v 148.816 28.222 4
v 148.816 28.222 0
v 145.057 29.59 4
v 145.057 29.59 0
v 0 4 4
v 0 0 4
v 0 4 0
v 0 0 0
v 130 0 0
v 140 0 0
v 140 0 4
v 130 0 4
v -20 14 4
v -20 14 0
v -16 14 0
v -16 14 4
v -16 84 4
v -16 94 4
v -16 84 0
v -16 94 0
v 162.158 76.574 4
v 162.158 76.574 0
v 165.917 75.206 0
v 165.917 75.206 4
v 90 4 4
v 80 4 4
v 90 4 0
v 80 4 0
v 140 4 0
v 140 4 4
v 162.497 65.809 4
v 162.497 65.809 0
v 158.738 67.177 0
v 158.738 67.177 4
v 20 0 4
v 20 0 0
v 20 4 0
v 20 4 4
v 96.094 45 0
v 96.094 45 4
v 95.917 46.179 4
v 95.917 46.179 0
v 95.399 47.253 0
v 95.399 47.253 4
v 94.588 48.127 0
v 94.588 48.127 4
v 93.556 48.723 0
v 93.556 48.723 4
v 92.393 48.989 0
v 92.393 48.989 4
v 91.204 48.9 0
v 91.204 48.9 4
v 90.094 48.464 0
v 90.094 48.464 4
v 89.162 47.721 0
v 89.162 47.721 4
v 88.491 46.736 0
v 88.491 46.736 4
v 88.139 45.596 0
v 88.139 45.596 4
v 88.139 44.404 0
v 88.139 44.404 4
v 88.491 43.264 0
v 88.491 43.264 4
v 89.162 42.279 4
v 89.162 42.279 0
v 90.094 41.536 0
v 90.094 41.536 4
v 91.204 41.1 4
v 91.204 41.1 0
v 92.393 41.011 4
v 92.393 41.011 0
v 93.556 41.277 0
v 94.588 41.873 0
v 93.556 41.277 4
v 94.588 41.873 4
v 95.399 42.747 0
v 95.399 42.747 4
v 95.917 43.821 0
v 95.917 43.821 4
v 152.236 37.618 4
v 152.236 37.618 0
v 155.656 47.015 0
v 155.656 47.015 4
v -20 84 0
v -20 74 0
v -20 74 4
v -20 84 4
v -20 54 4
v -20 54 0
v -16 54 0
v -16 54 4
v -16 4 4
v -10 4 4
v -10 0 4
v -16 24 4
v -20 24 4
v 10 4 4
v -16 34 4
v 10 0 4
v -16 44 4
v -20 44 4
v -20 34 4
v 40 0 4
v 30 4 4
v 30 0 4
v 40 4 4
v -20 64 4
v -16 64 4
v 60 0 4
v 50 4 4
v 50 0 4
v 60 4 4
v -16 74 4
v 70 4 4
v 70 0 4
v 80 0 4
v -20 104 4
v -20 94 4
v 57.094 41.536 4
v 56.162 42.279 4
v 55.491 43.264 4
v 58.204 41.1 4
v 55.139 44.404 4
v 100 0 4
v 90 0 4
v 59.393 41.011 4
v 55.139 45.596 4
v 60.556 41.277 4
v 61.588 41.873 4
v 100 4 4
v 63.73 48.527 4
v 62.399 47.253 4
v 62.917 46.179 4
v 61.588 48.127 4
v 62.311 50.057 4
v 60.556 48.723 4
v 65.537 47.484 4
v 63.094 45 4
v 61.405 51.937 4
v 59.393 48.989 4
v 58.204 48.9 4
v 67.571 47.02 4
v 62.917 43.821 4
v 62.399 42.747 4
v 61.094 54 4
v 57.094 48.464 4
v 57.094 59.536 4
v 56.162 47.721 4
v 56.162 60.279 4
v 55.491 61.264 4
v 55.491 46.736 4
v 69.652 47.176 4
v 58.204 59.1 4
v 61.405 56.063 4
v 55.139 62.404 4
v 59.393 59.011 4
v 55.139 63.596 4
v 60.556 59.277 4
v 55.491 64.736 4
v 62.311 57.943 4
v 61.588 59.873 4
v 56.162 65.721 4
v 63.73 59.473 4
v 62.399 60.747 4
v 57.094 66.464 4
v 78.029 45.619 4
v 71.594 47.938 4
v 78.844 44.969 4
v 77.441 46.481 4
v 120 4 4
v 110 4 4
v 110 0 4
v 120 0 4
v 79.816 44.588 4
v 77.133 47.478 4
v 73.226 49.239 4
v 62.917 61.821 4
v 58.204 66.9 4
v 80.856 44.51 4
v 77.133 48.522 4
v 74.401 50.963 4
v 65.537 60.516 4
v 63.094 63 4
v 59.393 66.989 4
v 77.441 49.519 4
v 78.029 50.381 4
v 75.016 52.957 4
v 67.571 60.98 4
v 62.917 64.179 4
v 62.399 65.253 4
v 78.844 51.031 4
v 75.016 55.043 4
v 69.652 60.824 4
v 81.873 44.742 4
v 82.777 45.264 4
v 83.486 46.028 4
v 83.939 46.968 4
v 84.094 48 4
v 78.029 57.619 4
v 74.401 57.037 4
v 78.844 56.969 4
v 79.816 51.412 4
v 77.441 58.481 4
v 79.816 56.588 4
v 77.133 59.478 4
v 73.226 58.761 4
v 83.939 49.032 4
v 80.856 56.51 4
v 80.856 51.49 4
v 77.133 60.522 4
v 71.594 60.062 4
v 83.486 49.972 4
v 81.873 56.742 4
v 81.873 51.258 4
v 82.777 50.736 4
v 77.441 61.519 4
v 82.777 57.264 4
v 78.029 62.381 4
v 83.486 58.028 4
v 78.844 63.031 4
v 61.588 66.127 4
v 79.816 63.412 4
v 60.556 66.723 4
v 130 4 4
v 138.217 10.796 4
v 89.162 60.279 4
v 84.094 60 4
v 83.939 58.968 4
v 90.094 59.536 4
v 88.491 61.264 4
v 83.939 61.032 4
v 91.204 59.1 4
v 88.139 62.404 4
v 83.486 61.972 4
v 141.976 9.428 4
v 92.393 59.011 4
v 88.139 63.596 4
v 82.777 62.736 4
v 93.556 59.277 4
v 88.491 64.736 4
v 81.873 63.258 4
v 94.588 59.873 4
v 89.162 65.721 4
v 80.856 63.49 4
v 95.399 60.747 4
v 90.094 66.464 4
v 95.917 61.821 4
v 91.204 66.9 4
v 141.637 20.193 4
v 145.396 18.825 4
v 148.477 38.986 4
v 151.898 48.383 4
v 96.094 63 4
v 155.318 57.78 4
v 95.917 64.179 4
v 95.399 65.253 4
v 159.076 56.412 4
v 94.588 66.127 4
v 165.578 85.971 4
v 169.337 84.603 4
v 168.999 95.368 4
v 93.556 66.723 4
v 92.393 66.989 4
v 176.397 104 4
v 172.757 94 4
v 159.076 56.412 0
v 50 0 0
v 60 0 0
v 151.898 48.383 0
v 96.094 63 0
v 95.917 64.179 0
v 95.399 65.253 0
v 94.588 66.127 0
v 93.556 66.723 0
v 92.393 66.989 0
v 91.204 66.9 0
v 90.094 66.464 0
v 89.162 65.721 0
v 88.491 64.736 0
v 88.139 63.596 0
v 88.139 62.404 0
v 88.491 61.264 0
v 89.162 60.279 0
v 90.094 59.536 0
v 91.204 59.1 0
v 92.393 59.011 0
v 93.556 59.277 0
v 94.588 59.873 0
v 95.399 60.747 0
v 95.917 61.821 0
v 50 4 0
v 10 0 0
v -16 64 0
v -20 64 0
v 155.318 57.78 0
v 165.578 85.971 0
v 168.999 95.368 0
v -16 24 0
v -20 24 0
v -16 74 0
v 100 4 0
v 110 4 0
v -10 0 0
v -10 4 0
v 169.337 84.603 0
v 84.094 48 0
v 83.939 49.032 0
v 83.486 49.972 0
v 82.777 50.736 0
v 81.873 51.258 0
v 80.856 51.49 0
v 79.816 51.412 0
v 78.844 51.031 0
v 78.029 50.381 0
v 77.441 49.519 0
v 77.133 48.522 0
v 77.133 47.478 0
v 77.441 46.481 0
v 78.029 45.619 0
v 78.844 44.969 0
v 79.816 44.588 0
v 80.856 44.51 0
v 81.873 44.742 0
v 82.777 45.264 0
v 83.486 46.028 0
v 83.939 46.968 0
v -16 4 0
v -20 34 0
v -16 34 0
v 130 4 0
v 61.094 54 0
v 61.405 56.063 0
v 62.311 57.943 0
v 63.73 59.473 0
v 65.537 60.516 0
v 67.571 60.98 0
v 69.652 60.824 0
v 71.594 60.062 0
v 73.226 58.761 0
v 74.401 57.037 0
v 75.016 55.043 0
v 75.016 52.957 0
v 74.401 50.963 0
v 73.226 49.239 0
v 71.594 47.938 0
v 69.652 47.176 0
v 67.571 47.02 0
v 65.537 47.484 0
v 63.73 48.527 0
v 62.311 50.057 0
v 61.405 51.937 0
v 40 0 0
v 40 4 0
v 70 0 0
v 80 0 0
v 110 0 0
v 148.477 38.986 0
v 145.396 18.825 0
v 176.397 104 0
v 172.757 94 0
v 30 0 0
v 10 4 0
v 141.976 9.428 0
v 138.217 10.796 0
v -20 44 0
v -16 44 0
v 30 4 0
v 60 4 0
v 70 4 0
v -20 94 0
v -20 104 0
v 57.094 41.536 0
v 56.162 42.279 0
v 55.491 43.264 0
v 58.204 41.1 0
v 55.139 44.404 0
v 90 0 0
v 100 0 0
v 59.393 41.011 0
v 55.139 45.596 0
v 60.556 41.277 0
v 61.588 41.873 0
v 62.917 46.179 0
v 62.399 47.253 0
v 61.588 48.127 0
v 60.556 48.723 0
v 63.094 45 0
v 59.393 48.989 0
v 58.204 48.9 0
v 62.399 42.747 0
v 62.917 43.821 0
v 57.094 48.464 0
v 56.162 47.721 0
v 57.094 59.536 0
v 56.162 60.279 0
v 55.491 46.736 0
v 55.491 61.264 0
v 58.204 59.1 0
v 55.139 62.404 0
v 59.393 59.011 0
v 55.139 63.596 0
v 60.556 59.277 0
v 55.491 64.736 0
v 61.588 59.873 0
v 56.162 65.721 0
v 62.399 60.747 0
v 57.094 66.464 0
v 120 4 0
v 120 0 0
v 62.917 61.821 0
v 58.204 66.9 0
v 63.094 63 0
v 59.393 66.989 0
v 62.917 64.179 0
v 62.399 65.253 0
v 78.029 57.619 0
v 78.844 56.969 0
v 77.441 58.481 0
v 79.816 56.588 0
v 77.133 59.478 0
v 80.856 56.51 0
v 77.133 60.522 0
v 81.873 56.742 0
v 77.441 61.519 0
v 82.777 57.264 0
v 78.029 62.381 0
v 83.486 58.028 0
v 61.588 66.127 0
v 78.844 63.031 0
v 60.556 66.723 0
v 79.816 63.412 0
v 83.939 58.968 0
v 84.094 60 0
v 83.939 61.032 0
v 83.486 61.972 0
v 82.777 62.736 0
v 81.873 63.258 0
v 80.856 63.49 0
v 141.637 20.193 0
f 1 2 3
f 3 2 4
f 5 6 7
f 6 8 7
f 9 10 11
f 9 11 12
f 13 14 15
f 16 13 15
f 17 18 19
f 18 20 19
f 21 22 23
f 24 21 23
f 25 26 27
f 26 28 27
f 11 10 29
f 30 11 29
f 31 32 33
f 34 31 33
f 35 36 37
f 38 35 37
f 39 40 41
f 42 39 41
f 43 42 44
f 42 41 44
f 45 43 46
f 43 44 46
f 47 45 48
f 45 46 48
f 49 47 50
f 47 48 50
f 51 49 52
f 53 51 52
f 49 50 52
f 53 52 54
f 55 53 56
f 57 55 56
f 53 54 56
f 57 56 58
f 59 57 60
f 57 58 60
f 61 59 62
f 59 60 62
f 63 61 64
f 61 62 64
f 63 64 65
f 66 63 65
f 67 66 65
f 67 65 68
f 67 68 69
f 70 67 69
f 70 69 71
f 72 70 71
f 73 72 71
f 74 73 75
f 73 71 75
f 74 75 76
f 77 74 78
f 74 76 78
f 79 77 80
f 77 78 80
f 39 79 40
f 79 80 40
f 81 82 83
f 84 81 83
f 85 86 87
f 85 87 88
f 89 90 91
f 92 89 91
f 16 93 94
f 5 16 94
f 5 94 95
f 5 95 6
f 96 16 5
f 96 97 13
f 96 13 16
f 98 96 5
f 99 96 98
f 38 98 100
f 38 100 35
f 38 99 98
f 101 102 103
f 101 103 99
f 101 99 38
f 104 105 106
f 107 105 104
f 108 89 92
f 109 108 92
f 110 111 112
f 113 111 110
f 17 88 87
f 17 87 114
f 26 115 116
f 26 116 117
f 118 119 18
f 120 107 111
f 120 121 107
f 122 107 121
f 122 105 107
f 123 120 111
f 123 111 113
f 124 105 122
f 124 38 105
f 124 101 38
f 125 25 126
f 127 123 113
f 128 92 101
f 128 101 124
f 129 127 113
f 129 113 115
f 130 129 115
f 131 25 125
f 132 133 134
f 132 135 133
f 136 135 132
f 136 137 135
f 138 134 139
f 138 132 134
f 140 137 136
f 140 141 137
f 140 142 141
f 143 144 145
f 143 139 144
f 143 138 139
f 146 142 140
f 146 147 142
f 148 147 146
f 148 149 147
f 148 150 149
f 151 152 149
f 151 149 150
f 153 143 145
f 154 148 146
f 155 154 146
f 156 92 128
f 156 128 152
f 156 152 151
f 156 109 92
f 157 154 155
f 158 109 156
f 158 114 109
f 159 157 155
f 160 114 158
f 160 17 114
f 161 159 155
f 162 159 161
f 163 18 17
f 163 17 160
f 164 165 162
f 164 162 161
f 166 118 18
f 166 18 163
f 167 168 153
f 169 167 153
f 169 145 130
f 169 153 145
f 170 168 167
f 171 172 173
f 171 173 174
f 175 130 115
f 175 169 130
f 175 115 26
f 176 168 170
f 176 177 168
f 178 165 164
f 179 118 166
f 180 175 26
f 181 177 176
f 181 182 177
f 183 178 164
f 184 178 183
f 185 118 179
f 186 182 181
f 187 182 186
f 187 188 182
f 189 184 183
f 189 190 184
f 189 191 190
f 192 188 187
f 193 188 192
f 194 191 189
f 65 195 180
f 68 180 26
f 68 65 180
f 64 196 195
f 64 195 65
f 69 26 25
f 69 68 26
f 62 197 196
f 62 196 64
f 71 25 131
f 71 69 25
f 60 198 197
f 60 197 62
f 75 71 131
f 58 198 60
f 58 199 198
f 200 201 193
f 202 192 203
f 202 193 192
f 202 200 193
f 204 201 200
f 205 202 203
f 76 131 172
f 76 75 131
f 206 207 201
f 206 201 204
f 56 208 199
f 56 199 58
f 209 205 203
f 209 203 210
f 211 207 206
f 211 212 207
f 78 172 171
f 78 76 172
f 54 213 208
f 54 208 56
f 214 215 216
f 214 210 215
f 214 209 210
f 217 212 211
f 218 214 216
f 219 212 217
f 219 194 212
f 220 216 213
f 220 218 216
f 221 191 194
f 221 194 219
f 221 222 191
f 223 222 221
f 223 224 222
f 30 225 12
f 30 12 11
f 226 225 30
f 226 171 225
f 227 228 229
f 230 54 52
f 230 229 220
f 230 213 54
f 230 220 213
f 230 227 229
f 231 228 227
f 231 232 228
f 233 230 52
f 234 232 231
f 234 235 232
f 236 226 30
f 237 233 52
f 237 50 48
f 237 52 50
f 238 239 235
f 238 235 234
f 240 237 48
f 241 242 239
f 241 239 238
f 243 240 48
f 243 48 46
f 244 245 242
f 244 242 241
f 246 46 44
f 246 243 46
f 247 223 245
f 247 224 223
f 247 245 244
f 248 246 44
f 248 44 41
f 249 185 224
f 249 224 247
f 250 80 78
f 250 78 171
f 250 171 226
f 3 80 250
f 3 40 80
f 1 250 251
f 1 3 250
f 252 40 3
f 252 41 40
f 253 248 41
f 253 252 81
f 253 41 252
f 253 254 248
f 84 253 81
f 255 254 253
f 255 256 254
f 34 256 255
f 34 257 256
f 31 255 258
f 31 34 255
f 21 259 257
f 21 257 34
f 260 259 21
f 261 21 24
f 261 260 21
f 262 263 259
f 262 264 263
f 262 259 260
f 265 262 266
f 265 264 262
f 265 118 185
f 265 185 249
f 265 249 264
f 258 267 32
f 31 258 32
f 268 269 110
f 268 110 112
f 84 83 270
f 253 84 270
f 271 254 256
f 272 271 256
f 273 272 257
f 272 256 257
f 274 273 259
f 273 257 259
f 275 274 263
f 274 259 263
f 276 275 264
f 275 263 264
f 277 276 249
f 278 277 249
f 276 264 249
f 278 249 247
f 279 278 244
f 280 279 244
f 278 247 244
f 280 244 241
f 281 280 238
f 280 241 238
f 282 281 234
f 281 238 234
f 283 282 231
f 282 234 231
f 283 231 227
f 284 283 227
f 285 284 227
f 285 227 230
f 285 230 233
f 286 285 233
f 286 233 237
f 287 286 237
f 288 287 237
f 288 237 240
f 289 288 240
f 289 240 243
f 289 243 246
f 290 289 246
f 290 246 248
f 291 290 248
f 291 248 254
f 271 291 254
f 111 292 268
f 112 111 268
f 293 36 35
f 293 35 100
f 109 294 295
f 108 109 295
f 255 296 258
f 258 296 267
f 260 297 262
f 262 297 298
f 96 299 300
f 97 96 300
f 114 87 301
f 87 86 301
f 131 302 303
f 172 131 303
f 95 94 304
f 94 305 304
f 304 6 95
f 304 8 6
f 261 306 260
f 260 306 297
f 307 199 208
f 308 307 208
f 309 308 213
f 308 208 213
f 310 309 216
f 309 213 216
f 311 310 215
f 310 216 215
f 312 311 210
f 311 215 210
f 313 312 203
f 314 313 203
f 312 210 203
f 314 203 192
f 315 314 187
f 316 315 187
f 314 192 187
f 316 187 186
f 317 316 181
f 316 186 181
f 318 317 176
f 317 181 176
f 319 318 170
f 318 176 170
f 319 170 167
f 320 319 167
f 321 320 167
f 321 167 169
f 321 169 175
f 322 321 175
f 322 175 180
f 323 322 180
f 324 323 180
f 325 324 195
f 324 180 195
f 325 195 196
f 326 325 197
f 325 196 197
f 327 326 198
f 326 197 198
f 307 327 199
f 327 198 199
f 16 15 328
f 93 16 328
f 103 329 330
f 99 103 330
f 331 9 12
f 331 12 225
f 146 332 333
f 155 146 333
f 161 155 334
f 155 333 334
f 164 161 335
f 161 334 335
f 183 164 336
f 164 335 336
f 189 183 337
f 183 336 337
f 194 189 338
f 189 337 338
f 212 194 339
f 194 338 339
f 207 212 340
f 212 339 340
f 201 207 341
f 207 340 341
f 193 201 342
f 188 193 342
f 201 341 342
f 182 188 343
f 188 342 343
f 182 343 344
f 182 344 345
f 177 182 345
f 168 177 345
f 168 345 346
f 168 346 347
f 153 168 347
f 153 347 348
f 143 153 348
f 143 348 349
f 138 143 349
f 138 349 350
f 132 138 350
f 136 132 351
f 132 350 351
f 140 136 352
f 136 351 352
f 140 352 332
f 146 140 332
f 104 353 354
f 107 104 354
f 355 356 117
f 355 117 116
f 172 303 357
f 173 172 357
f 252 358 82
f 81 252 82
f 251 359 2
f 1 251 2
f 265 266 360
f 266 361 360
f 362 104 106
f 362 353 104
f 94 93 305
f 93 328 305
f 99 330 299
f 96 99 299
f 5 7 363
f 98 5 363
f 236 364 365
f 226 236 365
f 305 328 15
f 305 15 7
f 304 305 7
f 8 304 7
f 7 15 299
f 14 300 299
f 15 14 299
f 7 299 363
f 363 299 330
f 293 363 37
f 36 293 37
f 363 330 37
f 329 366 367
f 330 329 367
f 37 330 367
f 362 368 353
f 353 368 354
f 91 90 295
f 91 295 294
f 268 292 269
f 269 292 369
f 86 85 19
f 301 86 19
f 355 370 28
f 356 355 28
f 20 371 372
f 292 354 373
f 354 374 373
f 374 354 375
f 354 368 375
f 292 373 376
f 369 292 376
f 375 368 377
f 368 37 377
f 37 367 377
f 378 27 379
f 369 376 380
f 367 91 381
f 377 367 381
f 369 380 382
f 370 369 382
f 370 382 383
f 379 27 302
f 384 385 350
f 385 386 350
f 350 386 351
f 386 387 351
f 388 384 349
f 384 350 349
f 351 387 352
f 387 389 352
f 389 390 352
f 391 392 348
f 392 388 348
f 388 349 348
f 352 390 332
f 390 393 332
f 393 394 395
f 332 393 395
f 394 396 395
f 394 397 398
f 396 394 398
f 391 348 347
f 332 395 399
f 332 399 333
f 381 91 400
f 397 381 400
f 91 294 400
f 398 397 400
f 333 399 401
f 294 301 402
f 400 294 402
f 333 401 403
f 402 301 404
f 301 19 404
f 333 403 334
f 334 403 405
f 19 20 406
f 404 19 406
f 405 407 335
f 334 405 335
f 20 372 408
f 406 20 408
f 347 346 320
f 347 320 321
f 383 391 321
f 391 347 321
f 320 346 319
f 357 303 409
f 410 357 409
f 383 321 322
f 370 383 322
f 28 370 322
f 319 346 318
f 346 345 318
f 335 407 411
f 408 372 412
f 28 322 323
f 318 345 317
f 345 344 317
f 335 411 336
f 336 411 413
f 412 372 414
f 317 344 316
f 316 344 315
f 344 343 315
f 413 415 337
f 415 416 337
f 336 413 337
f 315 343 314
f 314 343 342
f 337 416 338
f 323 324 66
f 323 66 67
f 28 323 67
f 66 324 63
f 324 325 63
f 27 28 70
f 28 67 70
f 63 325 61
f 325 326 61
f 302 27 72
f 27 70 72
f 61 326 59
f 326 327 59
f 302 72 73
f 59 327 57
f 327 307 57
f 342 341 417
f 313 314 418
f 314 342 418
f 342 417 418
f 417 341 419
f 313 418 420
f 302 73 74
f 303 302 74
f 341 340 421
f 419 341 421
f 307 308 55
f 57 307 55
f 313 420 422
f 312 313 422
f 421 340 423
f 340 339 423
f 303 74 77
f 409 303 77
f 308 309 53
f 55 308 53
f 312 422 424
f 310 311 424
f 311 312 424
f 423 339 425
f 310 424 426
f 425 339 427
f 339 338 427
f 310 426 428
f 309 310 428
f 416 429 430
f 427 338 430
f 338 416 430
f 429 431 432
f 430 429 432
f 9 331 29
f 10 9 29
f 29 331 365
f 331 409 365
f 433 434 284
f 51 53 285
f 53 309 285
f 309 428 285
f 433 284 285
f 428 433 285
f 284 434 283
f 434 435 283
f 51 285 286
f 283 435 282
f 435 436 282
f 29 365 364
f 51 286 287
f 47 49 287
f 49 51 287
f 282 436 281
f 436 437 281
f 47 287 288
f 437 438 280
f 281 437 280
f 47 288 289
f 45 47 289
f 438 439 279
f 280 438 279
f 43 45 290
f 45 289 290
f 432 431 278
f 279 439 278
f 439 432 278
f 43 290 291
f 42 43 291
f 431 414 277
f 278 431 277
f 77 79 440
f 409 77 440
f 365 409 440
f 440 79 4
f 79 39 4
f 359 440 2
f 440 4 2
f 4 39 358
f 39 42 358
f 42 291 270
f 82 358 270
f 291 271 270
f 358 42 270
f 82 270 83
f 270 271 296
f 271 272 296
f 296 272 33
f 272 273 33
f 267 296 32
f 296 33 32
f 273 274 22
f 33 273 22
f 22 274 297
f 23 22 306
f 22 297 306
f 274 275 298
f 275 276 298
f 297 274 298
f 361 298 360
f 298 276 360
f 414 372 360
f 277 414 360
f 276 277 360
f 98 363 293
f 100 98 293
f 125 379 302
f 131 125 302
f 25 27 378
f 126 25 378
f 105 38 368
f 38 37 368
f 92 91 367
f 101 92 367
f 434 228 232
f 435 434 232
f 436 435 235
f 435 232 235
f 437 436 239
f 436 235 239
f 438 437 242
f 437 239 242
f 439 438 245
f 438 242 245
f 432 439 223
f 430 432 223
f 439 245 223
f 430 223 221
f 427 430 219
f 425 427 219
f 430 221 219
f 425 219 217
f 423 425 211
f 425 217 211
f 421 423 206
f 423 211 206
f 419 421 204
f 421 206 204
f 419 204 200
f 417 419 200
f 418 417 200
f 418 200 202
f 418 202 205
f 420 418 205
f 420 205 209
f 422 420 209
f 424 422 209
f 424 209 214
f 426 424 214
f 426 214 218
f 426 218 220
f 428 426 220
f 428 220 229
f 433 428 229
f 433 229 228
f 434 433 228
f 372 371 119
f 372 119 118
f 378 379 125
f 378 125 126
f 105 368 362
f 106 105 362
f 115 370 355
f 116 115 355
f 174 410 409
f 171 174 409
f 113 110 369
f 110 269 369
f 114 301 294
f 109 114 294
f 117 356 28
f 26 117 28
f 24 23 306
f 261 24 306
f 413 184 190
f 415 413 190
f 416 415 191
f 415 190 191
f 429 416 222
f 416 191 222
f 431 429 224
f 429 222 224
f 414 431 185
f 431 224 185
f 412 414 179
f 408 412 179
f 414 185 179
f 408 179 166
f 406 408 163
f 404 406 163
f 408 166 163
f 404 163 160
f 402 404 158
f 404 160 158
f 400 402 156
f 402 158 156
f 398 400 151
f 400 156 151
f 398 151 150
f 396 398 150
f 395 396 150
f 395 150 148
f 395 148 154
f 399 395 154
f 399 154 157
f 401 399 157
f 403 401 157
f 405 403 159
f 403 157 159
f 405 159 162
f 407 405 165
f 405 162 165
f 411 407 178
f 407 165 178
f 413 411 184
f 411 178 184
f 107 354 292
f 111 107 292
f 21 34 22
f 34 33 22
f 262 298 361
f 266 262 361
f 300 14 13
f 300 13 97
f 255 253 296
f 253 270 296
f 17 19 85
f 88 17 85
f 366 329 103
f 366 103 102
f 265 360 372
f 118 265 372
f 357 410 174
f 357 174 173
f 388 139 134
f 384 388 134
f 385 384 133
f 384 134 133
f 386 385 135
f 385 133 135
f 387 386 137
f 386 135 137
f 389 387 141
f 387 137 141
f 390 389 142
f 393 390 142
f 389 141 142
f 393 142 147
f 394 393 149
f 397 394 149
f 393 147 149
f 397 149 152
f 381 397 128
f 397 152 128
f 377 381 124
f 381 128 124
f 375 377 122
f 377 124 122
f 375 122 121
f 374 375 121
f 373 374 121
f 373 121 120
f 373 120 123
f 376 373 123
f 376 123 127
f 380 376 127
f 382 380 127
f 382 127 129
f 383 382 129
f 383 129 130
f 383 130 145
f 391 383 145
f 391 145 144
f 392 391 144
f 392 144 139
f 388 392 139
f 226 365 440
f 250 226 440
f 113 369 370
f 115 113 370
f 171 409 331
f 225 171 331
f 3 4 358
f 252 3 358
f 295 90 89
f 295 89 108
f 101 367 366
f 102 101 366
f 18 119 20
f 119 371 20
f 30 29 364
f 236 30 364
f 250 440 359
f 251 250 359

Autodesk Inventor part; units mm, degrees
ref_plane "YZ Plane" through (0, 0, 0) normal (1, 0, 0) x (0, 1, 0)
ref_plane "XZ Plane" through (0, 0, 0) normal (0, 1, 0) x (-1, 0, 0)
ref_plane "XY Plane" through (0, 0, 0) normal (0, 0, 1) x (1, 0, 0)
sketch "Эскиз1" plane through (0, 0, 0) normal (0, 0, 1) x (1, 0, 0)
  line L0 (130, 0) -> (130, 4) projected
  line L1 (140, 4) -> (130, 4) projected
  line L2 (140, 0) -> (140, 4) projected
  line L3 (140, 0) -> (130, 0) projected
  line L4 (120, 0) -> (120, 4) projected
  line L5 (120, 4) -> (110, 4) projected
  line L6 (110, 4) -> (110, 0) projected
  line L7 (120, 0) -> (110, 0) projected
  line L8 (90, 4) -> (90, 0) projected
  line L9 (100, 0) -> (90, 0) projected
  line L10 (100, 0) -> (100, 4) projected
  line L11 (100, 4) -> (90, 4) projected
  line L12 (80, 0) -> (80, 4) projected
  line L13 (80, 4) -> (70, 4) projected
  line L14 (70, 4) -> (70, 0) projected
  line L15 (80, 0) -> (70, 0) projected
  line L16 (50, 4) -> (50, 0) projected
  line L17 (60, 0) -> (50, 0) projected
  line L18 (60, 0) -> (60, 4) projected
  line L19 (60, 4) -> (50, 4) projected
  line L20 (40, 0) -> (40, 4) projected
  line L21 (40, 4) -> (30, 4) projected
  line L22 (30, 4) -> (30, 0) projected
  line L23 (40, 0) -> (30, 0) projected
  line L24 (10, 4) -> (10, 0) projected
  line L25 (20, 0) -> (10, 0) projected
  line L26 (20, 0) -> (20, 4) projected
  line L27 (20, 4) -> (10, 4) projected
  line L28 (0, 0) -> (0, 4) projected
  line L29 (0, 4) -> (-10, 4) projected
  line L30 (-10, 4) -> (-10, 0) projected
  line L31 (0, 0) -> (-10, 0) projected
  line L32 (-20, 4) -> (-10, 4) projected
  line L33 (-20, 4) -> (140, 4)
  line L34 (-20, 4) -> (-20, 104)
  line L35 (140, 4) -> (176.397, 104)
  line L36 (140, 4) -> (246.4178, 4) construction
  line L37 (176.397, 104) -> (-20, 104)
  line L38 (-20, 94) -> (-16, 94)
  line L39 (-16, 94) -> (-16, 84)
  line L40 (-16, 84) -> (-20, 84)
  line L41 (-20, 84) -> (-20, 94)
  line L42 (-16, 74) -> (-16, 64)
  line L43 (-20, 64) -> (-20, 74)
  line L44 (-20, 74) -> (-16, 74)
  line L45 (-16, 64) -> (-20, 64)
  line L46 (-16, 54) -> (-16, 44)
  line L47 (-20, 44) -> (-20, 54)
  line L48 (-20, 54) -> (-16, 54)
  line L49 (-16, 44) -> (-20, 44)
  line L50 (-16, 34) -> (-16, 24)
  line L51 (-20, 24) -> (-20, 34)
  line L52 (-20, 34) -> (-16, 34)
  line L53 (-16, 24) -> (-20, 24)
  line L54 (-16, 14) -> (-16, 4)
  line L55 (-20, 4) -> (-20, 14)
  line L56 (-20, 14) -> (-16, 14)
  line L57 (-16, 4) -> (-20, 4)
  line L58 (172.7573, 94) -> (169.3371, 84.6031)
  line L59 (169.3371, 84.6031) -> (165.5783, 85.9712)
  line L60 (165.5783, 85.9712) -> (168.9986, 95.3681)
  line L61 (168.9986, 95.3681) -> (172.7573, 94)
  line L62 (158.7379, 67.1773) -> (162.1581, 76.5742)
  line L63 (165.9169, 75.2061) -> (162.4967, 65.8092)
  line L64 (162.1581, 76.5742) -> (165.9169, 75.2061)
  line L65 (162.4967, 65.8092) -> (158.7379, 67.1773)
  line L66 (151.8975, 48.3834) -> (155.3177, 57.7804)
  line L67 (159.0765, 56.4123) -> (155.6563, 47.0154)
  line L68 (155.3177, 57.7804) -> (159.0765, 56.4123)
  line L69 (155.6563, 47.0154) -> (151.8975, 48.3834)
  line L70 (145.0571, 29.5896) -> (148.4773, 38.9865)
  line L71 (152.2361, 37.6184) -> (148.8159, 28.2215)
  line L72 (148.4773, 38.9865) -> (152.2361, 37.6184)
  line L73 (148.8159, 28.2215) -> (145.0571, 29.5896)
  line L74 (138.2167, 10.7957) -> (141.6369, 20.1927)
  line L75 (145.3957, 18.8246) -> (141.9755, 9.4277)
  line L76 (141.6369, 20.1927) -> (145.3957, 18.8246)
  line L77 (141.9755, 9.4277) -> (138.2167, 10.7957)
  dimension "d0" = 100
  dimension "d1" = 70
  dimension "d2" = 4
  dimension "d3" = 10
  dimension "d4" = 10
  dimension "d7" = 20
  dimension "d12" = 10
  dimension "d13" = 4
  dimension "d14" = 10
  dimension "d17" = 20
extrude "Выдавливание1" add sketch "Эскиз1" along normal blind 4 contours L0 L1 L2 L3 | L33 L5 L11 L13 L19 L21 L27 L29 L32 L54 L56 L34 L53 L50 L52 L49 L46 L48 L45 L42 L44 L40 L39 L38 L37 L35 L61 L60 L59 L64 L62 L65 L68 L66 L69 L72 L70 L73 L76 L74 L77 L1 | L4 L7 L6 L5 | L10 L9 L8 L11 | L12 L15 L14 L13 | L18 L17 L16 L19 | L20 L23 L22 L21 | L26 L25 L24 L27 | L28 L31 L30 L29
sketch "Эскиз2" plane through (0, 0, 0) normal (0, 0, -1) x (-1, 0, 0)
  line L0 (-172.7573, 94) -> (-176.397, 104) projected
  line L1 (16, 4) -> (-176.397, 104) construction
  line L2 (-176.397, 104) -> (-140, 0)
  line L3 (-140, 0) -> (20, 104) construction
  line L4 (-68.0944, 4) -> (-68.0944, 104) construction
  line L5 (-176.397, 104) -> (20, 104) projected
  circle A0 centre (-68.0944, 54) radius 7
  line L6 (-60, 4) -> (-70, 4) projected
  point P0 (0, 0)
  dimension "d24" = 100
  dimension "d25" = 14
  dimension "d26" = 50
extrude "Выдавливание2" cut sketch "Эскиз2" against normal blind 10
sketch "Эскиз3" plane through (0, 0, 4) normal (0, 0, 1) x (1, 0, 0)
  circle A0 centre (68.0944, 54) radius 7 projected
  circle A1 centre (68.0944, 54) radius 6.25
  circle A2 centre (59.0944, 63) radius 4
  circle A3 centre (59.0944, 45) radius 4
  circle A4 centre (92.0944, 63) radius 3.5
  circle A5 centre (92.0944, 63) radius 4
  circle A6 centre (92.0944, 45) radius 4
  circle A7 centre (80.5944, 48) radius 3.5
  circle A8 centre (80.5944, 60) radius 3.5
  circle A9 centre (68.0944, 54) radius 6.75
  point P0 (0, 0)
extrude "Выдавливание3" cut sketch "Эскиз3" against normal blind 10 contours A0 | A1 | A2 | A3 | A4 | A5 | A6 | A7 | A8 | A9
properties part number "боковушка"
